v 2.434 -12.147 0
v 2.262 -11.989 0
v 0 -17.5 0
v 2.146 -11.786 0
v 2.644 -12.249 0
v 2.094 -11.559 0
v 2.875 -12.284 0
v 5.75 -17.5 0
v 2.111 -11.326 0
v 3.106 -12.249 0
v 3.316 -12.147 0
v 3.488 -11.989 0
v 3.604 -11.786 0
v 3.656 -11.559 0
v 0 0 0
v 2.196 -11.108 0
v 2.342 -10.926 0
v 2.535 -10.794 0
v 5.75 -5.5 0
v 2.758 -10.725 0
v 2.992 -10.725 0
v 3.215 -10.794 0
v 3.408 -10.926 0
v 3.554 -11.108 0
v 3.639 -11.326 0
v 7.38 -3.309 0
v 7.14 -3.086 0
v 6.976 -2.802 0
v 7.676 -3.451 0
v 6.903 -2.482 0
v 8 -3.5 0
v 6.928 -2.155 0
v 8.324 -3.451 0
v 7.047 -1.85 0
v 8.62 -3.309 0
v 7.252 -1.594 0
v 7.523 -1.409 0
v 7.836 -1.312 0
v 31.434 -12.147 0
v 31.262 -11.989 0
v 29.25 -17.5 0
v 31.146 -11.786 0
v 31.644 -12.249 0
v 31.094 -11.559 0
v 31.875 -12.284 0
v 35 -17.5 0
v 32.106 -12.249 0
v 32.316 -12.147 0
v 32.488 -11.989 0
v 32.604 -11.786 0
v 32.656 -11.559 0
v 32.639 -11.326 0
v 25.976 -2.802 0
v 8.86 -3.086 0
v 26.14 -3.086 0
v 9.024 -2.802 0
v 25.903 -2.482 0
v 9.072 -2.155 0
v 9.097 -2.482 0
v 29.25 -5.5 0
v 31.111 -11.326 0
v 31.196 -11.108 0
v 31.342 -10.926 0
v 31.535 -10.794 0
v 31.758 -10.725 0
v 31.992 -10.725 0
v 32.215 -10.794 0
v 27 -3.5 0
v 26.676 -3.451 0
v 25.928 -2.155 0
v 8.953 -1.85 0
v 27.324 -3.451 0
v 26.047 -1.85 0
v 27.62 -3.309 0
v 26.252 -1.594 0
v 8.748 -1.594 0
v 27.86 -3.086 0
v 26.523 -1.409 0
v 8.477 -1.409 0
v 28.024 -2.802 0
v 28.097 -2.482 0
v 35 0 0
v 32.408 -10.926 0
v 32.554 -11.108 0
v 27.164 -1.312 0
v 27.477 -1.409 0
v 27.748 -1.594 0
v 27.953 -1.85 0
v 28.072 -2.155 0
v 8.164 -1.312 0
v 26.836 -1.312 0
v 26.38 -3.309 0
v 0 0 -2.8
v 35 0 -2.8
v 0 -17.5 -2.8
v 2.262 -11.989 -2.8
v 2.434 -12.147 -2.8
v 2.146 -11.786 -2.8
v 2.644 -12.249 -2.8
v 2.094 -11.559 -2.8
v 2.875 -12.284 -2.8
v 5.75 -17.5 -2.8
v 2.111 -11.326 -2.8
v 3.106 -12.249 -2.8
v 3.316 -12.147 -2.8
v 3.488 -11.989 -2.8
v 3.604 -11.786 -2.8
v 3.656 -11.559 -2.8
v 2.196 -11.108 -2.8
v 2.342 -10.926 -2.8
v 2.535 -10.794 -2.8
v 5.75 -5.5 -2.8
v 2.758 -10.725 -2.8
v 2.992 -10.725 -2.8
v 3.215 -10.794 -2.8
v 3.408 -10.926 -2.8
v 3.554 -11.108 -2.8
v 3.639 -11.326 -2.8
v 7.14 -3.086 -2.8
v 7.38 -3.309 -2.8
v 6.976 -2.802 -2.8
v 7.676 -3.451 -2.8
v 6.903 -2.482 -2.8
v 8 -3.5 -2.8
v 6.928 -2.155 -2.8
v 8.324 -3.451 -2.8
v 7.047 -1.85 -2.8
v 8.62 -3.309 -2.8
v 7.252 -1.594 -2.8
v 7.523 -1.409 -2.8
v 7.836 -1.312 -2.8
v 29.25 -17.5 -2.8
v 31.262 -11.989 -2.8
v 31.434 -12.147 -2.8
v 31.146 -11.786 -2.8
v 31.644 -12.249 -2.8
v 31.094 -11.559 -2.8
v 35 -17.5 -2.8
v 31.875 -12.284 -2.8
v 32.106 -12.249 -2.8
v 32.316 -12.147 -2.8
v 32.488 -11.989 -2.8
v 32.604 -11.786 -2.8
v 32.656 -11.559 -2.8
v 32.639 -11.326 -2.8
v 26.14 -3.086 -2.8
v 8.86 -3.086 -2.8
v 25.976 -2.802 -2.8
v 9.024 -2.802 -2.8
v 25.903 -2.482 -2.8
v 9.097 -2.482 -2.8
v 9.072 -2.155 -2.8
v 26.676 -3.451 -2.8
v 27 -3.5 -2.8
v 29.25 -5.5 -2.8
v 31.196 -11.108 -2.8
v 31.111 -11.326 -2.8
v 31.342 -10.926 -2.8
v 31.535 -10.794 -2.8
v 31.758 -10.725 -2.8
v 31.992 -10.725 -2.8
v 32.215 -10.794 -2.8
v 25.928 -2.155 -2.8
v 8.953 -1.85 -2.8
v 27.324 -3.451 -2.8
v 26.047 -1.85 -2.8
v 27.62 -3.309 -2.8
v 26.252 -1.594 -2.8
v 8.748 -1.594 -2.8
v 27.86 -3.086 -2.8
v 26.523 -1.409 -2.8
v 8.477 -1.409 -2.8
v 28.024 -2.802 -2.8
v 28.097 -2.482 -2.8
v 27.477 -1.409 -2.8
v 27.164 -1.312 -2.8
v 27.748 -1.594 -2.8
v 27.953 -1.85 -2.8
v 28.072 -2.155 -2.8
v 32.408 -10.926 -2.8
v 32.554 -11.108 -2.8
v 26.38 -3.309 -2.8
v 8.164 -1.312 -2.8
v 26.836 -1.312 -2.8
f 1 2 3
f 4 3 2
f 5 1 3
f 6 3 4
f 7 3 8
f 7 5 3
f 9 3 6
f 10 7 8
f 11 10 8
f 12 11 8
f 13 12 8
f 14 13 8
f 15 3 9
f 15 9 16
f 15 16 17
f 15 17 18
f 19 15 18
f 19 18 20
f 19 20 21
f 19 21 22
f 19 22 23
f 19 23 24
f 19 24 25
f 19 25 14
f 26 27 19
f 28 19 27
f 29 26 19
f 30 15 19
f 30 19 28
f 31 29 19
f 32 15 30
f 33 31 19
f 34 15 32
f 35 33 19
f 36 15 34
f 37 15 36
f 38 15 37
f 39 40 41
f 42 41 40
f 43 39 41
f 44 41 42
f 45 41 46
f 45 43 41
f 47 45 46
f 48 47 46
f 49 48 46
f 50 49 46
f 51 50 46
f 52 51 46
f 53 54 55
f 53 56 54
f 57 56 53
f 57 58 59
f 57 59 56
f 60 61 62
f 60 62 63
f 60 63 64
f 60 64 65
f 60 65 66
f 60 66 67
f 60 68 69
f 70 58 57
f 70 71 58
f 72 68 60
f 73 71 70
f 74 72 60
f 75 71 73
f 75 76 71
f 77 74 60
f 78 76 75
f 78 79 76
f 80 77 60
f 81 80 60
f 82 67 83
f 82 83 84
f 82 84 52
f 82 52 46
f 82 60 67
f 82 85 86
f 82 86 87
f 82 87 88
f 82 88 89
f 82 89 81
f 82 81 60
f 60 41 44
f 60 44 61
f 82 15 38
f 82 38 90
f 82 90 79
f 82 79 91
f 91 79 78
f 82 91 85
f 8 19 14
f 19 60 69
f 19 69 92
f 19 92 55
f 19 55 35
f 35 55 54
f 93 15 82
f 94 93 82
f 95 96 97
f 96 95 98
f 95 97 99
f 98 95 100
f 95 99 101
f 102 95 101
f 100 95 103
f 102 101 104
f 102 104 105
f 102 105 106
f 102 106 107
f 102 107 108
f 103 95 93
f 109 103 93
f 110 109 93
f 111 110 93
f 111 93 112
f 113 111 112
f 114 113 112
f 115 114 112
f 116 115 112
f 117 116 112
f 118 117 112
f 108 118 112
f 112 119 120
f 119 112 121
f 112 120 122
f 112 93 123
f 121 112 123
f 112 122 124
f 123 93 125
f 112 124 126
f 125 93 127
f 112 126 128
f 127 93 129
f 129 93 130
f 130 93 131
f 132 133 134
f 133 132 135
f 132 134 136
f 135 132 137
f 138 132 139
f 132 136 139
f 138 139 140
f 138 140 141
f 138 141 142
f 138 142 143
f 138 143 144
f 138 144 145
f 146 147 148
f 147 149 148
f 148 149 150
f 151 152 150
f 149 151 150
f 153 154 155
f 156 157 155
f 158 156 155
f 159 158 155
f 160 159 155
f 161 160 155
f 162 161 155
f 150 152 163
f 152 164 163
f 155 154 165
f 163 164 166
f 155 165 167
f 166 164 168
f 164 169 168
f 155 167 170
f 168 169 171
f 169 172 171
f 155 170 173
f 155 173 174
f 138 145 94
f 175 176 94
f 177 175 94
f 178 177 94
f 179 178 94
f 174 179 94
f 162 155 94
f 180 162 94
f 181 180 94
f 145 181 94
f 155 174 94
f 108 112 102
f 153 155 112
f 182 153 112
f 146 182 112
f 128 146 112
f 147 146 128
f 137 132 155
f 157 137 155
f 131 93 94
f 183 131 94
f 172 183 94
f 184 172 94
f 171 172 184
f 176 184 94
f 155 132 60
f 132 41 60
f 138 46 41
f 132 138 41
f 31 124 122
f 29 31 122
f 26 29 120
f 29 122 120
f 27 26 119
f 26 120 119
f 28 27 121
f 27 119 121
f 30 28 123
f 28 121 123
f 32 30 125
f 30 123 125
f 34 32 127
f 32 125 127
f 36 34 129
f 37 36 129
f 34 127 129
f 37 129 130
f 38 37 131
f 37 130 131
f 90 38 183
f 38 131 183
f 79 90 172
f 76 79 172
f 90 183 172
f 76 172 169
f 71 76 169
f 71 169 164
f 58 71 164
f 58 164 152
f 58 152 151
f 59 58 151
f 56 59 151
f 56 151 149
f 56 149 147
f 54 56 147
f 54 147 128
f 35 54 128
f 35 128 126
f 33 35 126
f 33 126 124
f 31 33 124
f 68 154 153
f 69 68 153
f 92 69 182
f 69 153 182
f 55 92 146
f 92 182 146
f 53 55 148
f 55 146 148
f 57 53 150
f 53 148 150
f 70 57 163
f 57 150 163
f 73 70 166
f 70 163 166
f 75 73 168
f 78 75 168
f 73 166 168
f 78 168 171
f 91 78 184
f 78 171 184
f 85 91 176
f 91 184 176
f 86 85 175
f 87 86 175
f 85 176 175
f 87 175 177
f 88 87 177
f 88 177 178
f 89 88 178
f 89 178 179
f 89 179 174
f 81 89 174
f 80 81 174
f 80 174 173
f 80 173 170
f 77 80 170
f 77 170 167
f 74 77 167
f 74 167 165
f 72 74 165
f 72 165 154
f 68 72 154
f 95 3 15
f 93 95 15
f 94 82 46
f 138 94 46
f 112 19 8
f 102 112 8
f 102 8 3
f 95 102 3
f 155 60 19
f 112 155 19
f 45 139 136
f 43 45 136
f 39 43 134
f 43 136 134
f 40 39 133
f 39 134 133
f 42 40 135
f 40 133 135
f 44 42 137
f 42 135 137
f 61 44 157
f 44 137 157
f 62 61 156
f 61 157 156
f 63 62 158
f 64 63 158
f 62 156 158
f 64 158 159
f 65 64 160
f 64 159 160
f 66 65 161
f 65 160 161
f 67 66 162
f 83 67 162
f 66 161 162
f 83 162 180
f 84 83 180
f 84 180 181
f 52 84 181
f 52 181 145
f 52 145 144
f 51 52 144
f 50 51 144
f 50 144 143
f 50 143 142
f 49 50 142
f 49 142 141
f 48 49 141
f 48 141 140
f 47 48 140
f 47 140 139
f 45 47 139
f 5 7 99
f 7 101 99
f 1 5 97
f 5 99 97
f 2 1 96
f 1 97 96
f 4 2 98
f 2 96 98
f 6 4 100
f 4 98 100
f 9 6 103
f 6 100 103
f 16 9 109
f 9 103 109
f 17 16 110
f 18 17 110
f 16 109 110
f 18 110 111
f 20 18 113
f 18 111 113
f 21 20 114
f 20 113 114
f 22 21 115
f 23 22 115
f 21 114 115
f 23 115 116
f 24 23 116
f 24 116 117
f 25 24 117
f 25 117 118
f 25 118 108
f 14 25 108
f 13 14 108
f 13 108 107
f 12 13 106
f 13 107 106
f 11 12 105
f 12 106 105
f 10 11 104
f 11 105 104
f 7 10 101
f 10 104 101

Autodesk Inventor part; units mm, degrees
ref_plane "YZ Plane" through (0, 0, 0) normal (1, 0, 0) x (0, 1, 0)
ref_plane "XZ Plane" through (0, 0, 0) normal (0, 1, 0) x (-1, 0, 0)
ref_plane "XY Plane" through (0, 0, 0) normal (0, 0, 1) x (1, 0, 0)
sketch "Sketch1" plane through (0, 0, 0) normal (0, 0, 1) x (1, 0, 0)
  line L0 (0, 0) -> (35, 0)
  line L1 (35, 0) -> (35, -17.5)
  line L2 (35, -17.5) -> (0, -17.5)
  line L3 (0, -17.5) -> (0, 0)
  dimension "d0" = 17.5
  dimension "d1" = 35
extrude "Extrusion1" add sketch "Sketch1" against normal blind 2.8
sketch "Sketch2" plane through (0, 0, 0) normal (0, 0, 1) x (1, 0, 0)
  line L0 (35, -17.5) -> (0, -17.5) projected
  line L1 (5.75, -23.2591) -> (29.25, -23.2591)
  line L2 (29.25, -23.2591) -> (29.25, -5.5)
  line L3 (29.25, -5.5) -> (5.75, -5.5)
  line L4 (5.75, -5.5) -> (5.75, -23.2591)
  point P0 (17.5, -5.5)
  point P1 (17.5, -17.5)
  dimension "d4" = 12
  dimension "d5" = 23.5
extrude "Extrusion2" cut sketch "Sketch2" against normal through all
sketch "Sketch3" plane through (0, 0, 0) normal (0, 0, 1) x (1, 0, 0)
  line L0 (0, 0) -> (35, 0) projected
  line L1 (0, -17.5) -> (0, 0) projected
  point P0 (8, -2.4)
  point P1 (27, -2.4)
  dimension "d8" = 8
  dimension "d9" = 19
  dimension "d10" = 2.4
hole "Hole1" at (8, -2.4, 0) at (27, -2.4, 0) direction (0, 0, -1) diameter 2.2 end through all
sketch "Sketch4" plane through (0, 0, 0) normal (0, 0, 1) x (1, 0, 0)
  line L0 (29.25, -5.5) -> (29.25, -17.5) projected
  line L1 (5.75, -17.5) -> (0, -17.5) projected
  line L2 (5.75, -17.5) -> (5.75, -5.5) projected
  point P0 (2.875, -11.5)
  point P1 (31.875, -11.5)
  point P2 (5.75, -11.5)
  point P3 (29.25, -11.5)
  point P4 (2.875, -17.5)
hole "Hole2" at (2.875, -11.5, 0) at (31.875, -11.5, 0) direction (0, 0, -1) diameter 1.567 end through all thread size "M2x0.4" class "6H" standard "ISO Metric profile"
properties part number "Servo Mount2"
